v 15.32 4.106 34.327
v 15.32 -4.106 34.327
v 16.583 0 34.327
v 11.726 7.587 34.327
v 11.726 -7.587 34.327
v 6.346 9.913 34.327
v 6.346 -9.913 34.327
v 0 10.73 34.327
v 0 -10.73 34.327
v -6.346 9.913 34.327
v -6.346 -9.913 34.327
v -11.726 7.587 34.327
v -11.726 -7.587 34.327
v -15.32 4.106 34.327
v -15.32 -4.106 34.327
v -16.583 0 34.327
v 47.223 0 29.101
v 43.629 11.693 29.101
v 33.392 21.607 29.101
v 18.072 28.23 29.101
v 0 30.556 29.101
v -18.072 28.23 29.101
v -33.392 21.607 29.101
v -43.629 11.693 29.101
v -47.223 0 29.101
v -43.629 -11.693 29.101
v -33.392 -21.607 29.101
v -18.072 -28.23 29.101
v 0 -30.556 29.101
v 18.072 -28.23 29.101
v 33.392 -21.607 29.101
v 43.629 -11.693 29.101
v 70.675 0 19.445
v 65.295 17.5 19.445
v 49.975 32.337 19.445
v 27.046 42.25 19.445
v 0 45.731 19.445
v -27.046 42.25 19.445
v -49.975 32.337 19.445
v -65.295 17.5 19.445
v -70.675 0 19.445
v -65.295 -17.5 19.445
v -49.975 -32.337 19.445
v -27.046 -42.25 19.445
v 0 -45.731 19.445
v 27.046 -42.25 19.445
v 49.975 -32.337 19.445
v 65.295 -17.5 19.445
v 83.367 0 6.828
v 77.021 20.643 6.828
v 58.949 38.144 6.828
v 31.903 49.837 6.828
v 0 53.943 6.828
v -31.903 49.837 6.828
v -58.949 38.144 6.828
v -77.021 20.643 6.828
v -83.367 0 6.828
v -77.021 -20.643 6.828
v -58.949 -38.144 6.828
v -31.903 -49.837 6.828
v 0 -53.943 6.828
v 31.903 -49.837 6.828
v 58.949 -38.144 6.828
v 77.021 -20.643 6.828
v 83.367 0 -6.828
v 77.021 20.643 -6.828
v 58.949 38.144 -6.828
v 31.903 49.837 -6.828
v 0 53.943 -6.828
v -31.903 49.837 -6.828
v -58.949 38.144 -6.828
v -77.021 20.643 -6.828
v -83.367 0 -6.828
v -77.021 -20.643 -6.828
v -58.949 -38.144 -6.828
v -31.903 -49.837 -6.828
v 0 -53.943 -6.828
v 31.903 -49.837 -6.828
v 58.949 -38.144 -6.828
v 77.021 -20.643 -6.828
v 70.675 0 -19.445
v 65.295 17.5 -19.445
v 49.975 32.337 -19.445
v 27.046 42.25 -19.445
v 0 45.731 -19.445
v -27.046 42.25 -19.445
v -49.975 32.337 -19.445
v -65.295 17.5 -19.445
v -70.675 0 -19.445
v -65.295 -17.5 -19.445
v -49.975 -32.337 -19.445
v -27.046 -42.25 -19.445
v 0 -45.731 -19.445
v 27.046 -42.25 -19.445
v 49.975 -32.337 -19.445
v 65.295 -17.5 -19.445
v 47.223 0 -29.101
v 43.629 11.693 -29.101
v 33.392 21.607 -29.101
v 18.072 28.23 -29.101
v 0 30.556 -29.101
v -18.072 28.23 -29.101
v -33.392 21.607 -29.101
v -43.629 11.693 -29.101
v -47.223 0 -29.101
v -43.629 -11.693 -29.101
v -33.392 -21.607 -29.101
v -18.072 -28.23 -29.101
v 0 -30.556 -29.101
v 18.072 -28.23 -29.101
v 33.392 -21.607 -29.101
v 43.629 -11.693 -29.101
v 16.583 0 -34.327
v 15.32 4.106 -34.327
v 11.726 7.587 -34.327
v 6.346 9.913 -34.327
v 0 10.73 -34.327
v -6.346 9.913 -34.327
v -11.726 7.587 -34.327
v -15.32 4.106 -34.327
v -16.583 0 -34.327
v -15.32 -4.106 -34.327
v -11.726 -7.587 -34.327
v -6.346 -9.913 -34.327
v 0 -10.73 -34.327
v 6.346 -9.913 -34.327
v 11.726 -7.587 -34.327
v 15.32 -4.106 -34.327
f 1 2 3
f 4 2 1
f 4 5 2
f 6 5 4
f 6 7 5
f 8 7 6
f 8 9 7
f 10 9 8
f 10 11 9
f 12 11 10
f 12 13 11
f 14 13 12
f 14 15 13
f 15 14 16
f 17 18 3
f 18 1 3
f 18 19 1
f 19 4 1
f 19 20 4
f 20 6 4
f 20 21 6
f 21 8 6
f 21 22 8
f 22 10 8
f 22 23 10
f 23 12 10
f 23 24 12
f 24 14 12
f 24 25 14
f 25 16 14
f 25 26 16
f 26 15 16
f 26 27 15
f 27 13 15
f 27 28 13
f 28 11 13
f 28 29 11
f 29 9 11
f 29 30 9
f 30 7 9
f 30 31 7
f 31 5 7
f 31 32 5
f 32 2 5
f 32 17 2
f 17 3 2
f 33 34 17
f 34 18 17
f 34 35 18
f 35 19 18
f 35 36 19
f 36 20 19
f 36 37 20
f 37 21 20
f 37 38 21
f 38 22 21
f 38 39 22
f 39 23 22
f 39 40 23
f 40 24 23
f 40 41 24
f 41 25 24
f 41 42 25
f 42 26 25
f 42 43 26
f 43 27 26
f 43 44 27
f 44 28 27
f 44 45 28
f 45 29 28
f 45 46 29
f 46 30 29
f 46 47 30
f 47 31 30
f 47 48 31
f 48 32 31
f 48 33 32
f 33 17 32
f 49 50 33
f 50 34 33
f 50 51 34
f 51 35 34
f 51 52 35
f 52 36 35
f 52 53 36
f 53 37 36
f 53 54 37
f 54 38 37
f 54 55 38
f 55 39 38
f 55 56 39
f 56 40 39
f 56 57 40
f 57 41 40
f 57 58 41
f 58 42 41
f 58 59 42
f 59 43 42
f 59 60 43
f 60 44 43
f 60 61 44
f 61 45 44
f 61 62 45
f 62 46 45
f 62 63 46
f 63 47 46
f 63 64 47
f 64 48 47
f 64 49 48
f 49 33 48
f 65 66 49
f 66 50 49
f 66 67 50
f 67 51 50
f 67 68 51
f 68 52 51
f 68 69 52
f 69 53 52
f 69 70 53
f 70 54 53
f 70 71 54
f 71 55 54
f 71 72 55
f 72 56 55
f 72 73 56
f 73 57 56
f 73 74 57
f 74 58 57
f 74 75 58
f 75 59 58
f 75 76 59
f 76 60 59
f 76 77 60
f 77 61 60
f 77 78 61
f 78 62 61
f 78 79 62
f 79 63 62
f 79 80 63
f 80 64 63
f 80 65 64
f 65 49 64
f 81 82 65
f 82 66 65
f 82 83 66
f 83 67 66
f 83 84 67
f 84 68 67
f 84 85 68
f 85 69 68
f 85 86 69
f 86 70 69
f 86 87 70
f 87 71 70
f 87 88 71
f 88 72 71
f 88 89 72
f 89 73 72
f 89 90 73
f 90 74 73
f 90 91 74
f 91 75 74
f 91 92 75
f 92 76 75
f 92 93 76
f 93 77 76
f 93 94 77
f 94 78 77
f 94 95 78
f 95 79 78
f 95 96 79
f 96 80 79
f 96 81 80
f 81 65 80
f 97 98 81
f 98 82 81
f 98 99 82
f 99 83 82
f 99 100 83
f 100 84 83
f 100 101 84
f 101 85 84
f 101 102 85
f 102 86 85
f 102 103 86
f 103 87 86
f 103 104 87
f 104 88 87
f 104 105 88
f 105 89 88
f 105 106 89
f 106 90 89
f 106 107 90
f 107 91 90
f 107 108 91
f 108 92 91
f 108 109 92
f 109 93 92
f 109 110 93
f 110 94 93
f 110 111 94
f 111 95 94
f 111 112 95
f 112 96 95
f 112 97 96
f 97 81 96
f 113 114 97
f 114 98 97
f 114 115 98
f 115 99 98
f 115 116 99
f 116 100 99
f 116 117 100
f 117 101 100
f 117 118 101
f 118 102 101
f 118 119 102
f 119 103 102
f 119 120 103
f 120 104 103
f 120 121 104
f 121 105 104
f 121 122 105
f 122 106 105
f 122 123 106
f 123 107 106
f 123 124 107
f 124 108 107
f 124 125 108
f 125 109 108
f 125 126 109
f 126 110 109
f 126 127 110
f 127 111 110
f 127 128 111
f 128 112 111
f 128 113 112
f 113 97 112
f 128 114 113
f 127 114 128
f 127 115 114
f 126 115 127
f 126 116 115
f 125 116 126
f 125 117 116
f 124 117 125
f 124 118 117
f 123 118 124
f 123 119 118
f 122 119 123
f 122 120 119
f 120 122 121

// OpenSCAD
// Generated by SolidPython 1.0.1 on 2020-07-29 00:46:53


scale(v = [17, 11, 7]) {
	sphere(r = 5);
}
/***********************************************
*********      SolidPython code:      **********
************************************************
 
# import packages: SolidPython
from solid import *
from solid.utils import *
from itertools import chain, combinations, permutations


class Resize:

    def __init__(self, scad_file):
        self.scad_file = scad_file
        #self.scad_file = import_scad(scad_file)
        # cone/cylinder param:
        self.r1 = 0
        self.r2 = 0
        self.h = 0
        # rectangular prism param:
        self.w = 0
        self.l = 0
        # ellipse param:
        self.r = 0

    # import OpenScad code (file name corresponds to shape)


    # classify shape + parameters
    def assign(self, param1, param2, param3):
        if self.scad_file == 'cone.scad':
            self.r1 = param1
            self.r2 = param2
            self.h = param3
        elif self.scad_file == 'cylinder.scad':
            self.r1 = param1
            self.r2 = param2
            self.h = param3
        elif self.scad_file == 'rectangularPrism.scad':
            self.h = param1
            self.l = param2
            self.w = param3
        else:
            self.r = param1
            self.h = param2

    # resize parameters
    def iterate(self):
        x = range(3, 20, 2)
        i = 1
        if self.scad_file == 'cone.scad':
            tempList = list(permutations(x, 2))
            for temp in tempList:
                param1 = temp[0]
                param2 = temp[1]
                filepath = 'produced_scad_files/' + 'cone' + str(param1) + '_' + str(param2) + '_' + '.scad'
                scad_render_to_file(cylinder(h=param1, r1=param2, r2=0), filepath)

        elif self.scad_file == 'cylinder.scad':
            tempList = list(permutations(x, 3))
            for temp in tempList:
                param1 = temp[0]
                param2 = temp[1]
                filepath = 'produced_scad_files/' + 'cylinder' + str(param1) + '_' + str(param2) + '_' + '.scad'
                scad_render_to_file(cylinder(h=param1, r1=param2, r2=param2), filepath)

        elif self.scad_file == 'rectangularPrism.scad':
            tempList = list(permutations(x, 3))
            for temp in tempList:
                param1 = temp[0]
                param2 = temp[1]
                param3 = temp[2]
                filepath = 'produced_scad_files/' + 'rectangularPrism' + str(param1) + '_' + str(param2) + '_' + str(
                    param3) + '.scad'
                scad_render_to_file(cube(size=(param1, param2, param3)), filepath)

        elif self.scad_file == 'ellipse.scad':
            tempList = list(permutations(x, 4))
            for temp in tempList:
                param1 = temp[0]
                param2 = temp[1]
                param3 = temp[2]
                param4 = temp[3]
                filepath = 'produced_scad_files/' + 'ellipse' + str(param1) + '_' + str(param2) + '_' + str(param3) + '_' + str(param4) + '.scad'
                scad_render_to_file(scale([param1, param2, param3])(sphere(r=param4)), filepath)

    def render_to_scadfile(self):
        scad_render_to_file(scad, 'example.scad') 
 
************************************************/
